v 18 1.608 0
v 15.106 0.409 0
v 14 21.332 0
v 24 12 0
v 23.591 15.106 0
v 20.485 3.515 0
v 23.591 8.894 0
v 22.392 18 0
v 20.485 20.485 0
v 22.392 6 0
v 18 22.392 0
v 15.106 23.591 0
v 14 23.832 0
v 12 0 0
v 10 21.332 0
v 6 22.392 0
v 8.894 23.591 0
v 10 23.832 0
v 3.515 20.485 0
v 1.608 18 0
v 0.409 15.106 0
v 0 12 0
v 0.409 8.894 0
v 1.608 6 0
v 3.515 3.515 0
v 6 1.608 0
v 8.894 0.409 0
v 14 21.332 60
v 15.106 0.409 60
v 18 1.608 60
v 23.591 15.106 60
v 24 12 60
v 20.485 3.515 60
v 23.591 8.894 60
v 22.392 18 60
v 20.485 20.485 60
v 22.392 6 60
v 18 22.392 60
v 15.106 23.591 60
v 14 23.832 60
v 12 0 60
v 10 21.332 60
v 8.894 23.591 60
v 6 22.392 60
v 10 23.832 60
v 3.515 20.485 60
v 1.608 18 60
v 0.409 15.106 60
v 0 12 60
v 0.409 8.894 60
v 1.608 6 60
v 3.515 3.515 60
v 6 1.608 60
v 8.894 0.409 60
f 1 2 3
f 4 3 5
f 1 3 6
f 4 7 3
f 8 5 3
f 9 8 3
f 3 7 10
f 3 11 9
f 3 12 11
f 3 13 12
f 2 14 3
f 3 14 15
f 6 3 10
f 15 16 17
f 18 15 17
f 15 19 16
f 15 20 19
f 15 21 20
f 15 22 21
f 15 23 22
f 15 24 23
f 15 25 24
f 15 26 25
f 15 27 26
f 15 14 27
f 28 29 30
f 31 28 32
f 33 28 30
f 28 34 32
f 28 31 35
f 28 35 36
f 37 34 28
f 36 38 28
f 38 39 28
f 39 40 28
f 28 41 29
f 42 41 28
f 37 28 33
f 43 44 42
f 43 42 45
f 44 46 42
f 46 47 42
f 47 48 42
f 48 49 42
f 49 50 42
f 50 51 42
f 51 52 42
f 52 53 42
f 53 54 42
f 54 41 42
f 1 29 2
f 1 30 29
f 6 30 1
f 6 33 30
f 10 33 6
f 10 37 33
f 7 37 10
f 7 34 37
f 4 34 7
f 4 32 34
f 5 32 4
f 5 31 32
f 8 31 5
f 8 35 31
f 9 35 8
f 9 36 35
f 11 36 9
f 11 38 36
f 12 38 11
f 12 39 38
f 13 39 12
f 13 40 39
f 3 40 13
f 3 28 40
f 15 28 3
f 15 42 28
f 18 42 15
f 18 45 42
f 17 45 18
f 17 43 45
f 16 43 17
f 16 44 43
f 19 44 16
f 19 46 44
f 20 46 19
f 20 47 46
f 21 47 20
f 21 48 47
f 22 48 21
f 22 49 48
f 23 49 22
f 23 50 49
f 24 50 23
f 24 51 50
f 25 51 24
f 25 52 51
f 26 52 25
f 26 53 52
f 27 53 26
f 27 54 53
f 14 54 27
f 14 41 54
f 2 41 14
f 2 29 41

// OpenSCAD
$fn = 32;

// ----------------------------------------------------------------------
// Keyway shaft: d24 shaft, key 4 x 2.5 mm
// ----------------------------------------------------------------------

// --- parameters (mm) ---
shaft_r = 12;             // shaft radius
key_w = 4;                // keyway width
key_d = 2.5;              // keyway depth below the surface line
plate_t = 60;             // shaft length, Z (extrusion height)

shaft_d = 2 * shaft_r;  // shaft diameter
circle_step = 15;  // polygon sampling step, degrees

profile = [[8.894, 23.591], [6, 22.392], [3.515, 20.485], [1.608, 18], [0.409, 15.106], [0, 12], [0.409, 8.894], [1.608, 6], [3.515, 3.515], [6, 1.608], [8.894, 0.409], [12, 0], [15.106, 0.409], [18, 1.608], [20.485, 3.515], [22.392, 6], [23.591, 8.894], [24, 12], [23.591, 15.106], [22.392, 18], [20.485, 20.485], [18, 22.392], [15.106, 23.591], [14, 23.832], [14, 21.332], [10, 21.332], [10, 23.832]];  // primary outline, 27 points, counter clockwise

// --- the one profile operation ---
linear_extrude(height = plate_t) polygon(points = profile);
